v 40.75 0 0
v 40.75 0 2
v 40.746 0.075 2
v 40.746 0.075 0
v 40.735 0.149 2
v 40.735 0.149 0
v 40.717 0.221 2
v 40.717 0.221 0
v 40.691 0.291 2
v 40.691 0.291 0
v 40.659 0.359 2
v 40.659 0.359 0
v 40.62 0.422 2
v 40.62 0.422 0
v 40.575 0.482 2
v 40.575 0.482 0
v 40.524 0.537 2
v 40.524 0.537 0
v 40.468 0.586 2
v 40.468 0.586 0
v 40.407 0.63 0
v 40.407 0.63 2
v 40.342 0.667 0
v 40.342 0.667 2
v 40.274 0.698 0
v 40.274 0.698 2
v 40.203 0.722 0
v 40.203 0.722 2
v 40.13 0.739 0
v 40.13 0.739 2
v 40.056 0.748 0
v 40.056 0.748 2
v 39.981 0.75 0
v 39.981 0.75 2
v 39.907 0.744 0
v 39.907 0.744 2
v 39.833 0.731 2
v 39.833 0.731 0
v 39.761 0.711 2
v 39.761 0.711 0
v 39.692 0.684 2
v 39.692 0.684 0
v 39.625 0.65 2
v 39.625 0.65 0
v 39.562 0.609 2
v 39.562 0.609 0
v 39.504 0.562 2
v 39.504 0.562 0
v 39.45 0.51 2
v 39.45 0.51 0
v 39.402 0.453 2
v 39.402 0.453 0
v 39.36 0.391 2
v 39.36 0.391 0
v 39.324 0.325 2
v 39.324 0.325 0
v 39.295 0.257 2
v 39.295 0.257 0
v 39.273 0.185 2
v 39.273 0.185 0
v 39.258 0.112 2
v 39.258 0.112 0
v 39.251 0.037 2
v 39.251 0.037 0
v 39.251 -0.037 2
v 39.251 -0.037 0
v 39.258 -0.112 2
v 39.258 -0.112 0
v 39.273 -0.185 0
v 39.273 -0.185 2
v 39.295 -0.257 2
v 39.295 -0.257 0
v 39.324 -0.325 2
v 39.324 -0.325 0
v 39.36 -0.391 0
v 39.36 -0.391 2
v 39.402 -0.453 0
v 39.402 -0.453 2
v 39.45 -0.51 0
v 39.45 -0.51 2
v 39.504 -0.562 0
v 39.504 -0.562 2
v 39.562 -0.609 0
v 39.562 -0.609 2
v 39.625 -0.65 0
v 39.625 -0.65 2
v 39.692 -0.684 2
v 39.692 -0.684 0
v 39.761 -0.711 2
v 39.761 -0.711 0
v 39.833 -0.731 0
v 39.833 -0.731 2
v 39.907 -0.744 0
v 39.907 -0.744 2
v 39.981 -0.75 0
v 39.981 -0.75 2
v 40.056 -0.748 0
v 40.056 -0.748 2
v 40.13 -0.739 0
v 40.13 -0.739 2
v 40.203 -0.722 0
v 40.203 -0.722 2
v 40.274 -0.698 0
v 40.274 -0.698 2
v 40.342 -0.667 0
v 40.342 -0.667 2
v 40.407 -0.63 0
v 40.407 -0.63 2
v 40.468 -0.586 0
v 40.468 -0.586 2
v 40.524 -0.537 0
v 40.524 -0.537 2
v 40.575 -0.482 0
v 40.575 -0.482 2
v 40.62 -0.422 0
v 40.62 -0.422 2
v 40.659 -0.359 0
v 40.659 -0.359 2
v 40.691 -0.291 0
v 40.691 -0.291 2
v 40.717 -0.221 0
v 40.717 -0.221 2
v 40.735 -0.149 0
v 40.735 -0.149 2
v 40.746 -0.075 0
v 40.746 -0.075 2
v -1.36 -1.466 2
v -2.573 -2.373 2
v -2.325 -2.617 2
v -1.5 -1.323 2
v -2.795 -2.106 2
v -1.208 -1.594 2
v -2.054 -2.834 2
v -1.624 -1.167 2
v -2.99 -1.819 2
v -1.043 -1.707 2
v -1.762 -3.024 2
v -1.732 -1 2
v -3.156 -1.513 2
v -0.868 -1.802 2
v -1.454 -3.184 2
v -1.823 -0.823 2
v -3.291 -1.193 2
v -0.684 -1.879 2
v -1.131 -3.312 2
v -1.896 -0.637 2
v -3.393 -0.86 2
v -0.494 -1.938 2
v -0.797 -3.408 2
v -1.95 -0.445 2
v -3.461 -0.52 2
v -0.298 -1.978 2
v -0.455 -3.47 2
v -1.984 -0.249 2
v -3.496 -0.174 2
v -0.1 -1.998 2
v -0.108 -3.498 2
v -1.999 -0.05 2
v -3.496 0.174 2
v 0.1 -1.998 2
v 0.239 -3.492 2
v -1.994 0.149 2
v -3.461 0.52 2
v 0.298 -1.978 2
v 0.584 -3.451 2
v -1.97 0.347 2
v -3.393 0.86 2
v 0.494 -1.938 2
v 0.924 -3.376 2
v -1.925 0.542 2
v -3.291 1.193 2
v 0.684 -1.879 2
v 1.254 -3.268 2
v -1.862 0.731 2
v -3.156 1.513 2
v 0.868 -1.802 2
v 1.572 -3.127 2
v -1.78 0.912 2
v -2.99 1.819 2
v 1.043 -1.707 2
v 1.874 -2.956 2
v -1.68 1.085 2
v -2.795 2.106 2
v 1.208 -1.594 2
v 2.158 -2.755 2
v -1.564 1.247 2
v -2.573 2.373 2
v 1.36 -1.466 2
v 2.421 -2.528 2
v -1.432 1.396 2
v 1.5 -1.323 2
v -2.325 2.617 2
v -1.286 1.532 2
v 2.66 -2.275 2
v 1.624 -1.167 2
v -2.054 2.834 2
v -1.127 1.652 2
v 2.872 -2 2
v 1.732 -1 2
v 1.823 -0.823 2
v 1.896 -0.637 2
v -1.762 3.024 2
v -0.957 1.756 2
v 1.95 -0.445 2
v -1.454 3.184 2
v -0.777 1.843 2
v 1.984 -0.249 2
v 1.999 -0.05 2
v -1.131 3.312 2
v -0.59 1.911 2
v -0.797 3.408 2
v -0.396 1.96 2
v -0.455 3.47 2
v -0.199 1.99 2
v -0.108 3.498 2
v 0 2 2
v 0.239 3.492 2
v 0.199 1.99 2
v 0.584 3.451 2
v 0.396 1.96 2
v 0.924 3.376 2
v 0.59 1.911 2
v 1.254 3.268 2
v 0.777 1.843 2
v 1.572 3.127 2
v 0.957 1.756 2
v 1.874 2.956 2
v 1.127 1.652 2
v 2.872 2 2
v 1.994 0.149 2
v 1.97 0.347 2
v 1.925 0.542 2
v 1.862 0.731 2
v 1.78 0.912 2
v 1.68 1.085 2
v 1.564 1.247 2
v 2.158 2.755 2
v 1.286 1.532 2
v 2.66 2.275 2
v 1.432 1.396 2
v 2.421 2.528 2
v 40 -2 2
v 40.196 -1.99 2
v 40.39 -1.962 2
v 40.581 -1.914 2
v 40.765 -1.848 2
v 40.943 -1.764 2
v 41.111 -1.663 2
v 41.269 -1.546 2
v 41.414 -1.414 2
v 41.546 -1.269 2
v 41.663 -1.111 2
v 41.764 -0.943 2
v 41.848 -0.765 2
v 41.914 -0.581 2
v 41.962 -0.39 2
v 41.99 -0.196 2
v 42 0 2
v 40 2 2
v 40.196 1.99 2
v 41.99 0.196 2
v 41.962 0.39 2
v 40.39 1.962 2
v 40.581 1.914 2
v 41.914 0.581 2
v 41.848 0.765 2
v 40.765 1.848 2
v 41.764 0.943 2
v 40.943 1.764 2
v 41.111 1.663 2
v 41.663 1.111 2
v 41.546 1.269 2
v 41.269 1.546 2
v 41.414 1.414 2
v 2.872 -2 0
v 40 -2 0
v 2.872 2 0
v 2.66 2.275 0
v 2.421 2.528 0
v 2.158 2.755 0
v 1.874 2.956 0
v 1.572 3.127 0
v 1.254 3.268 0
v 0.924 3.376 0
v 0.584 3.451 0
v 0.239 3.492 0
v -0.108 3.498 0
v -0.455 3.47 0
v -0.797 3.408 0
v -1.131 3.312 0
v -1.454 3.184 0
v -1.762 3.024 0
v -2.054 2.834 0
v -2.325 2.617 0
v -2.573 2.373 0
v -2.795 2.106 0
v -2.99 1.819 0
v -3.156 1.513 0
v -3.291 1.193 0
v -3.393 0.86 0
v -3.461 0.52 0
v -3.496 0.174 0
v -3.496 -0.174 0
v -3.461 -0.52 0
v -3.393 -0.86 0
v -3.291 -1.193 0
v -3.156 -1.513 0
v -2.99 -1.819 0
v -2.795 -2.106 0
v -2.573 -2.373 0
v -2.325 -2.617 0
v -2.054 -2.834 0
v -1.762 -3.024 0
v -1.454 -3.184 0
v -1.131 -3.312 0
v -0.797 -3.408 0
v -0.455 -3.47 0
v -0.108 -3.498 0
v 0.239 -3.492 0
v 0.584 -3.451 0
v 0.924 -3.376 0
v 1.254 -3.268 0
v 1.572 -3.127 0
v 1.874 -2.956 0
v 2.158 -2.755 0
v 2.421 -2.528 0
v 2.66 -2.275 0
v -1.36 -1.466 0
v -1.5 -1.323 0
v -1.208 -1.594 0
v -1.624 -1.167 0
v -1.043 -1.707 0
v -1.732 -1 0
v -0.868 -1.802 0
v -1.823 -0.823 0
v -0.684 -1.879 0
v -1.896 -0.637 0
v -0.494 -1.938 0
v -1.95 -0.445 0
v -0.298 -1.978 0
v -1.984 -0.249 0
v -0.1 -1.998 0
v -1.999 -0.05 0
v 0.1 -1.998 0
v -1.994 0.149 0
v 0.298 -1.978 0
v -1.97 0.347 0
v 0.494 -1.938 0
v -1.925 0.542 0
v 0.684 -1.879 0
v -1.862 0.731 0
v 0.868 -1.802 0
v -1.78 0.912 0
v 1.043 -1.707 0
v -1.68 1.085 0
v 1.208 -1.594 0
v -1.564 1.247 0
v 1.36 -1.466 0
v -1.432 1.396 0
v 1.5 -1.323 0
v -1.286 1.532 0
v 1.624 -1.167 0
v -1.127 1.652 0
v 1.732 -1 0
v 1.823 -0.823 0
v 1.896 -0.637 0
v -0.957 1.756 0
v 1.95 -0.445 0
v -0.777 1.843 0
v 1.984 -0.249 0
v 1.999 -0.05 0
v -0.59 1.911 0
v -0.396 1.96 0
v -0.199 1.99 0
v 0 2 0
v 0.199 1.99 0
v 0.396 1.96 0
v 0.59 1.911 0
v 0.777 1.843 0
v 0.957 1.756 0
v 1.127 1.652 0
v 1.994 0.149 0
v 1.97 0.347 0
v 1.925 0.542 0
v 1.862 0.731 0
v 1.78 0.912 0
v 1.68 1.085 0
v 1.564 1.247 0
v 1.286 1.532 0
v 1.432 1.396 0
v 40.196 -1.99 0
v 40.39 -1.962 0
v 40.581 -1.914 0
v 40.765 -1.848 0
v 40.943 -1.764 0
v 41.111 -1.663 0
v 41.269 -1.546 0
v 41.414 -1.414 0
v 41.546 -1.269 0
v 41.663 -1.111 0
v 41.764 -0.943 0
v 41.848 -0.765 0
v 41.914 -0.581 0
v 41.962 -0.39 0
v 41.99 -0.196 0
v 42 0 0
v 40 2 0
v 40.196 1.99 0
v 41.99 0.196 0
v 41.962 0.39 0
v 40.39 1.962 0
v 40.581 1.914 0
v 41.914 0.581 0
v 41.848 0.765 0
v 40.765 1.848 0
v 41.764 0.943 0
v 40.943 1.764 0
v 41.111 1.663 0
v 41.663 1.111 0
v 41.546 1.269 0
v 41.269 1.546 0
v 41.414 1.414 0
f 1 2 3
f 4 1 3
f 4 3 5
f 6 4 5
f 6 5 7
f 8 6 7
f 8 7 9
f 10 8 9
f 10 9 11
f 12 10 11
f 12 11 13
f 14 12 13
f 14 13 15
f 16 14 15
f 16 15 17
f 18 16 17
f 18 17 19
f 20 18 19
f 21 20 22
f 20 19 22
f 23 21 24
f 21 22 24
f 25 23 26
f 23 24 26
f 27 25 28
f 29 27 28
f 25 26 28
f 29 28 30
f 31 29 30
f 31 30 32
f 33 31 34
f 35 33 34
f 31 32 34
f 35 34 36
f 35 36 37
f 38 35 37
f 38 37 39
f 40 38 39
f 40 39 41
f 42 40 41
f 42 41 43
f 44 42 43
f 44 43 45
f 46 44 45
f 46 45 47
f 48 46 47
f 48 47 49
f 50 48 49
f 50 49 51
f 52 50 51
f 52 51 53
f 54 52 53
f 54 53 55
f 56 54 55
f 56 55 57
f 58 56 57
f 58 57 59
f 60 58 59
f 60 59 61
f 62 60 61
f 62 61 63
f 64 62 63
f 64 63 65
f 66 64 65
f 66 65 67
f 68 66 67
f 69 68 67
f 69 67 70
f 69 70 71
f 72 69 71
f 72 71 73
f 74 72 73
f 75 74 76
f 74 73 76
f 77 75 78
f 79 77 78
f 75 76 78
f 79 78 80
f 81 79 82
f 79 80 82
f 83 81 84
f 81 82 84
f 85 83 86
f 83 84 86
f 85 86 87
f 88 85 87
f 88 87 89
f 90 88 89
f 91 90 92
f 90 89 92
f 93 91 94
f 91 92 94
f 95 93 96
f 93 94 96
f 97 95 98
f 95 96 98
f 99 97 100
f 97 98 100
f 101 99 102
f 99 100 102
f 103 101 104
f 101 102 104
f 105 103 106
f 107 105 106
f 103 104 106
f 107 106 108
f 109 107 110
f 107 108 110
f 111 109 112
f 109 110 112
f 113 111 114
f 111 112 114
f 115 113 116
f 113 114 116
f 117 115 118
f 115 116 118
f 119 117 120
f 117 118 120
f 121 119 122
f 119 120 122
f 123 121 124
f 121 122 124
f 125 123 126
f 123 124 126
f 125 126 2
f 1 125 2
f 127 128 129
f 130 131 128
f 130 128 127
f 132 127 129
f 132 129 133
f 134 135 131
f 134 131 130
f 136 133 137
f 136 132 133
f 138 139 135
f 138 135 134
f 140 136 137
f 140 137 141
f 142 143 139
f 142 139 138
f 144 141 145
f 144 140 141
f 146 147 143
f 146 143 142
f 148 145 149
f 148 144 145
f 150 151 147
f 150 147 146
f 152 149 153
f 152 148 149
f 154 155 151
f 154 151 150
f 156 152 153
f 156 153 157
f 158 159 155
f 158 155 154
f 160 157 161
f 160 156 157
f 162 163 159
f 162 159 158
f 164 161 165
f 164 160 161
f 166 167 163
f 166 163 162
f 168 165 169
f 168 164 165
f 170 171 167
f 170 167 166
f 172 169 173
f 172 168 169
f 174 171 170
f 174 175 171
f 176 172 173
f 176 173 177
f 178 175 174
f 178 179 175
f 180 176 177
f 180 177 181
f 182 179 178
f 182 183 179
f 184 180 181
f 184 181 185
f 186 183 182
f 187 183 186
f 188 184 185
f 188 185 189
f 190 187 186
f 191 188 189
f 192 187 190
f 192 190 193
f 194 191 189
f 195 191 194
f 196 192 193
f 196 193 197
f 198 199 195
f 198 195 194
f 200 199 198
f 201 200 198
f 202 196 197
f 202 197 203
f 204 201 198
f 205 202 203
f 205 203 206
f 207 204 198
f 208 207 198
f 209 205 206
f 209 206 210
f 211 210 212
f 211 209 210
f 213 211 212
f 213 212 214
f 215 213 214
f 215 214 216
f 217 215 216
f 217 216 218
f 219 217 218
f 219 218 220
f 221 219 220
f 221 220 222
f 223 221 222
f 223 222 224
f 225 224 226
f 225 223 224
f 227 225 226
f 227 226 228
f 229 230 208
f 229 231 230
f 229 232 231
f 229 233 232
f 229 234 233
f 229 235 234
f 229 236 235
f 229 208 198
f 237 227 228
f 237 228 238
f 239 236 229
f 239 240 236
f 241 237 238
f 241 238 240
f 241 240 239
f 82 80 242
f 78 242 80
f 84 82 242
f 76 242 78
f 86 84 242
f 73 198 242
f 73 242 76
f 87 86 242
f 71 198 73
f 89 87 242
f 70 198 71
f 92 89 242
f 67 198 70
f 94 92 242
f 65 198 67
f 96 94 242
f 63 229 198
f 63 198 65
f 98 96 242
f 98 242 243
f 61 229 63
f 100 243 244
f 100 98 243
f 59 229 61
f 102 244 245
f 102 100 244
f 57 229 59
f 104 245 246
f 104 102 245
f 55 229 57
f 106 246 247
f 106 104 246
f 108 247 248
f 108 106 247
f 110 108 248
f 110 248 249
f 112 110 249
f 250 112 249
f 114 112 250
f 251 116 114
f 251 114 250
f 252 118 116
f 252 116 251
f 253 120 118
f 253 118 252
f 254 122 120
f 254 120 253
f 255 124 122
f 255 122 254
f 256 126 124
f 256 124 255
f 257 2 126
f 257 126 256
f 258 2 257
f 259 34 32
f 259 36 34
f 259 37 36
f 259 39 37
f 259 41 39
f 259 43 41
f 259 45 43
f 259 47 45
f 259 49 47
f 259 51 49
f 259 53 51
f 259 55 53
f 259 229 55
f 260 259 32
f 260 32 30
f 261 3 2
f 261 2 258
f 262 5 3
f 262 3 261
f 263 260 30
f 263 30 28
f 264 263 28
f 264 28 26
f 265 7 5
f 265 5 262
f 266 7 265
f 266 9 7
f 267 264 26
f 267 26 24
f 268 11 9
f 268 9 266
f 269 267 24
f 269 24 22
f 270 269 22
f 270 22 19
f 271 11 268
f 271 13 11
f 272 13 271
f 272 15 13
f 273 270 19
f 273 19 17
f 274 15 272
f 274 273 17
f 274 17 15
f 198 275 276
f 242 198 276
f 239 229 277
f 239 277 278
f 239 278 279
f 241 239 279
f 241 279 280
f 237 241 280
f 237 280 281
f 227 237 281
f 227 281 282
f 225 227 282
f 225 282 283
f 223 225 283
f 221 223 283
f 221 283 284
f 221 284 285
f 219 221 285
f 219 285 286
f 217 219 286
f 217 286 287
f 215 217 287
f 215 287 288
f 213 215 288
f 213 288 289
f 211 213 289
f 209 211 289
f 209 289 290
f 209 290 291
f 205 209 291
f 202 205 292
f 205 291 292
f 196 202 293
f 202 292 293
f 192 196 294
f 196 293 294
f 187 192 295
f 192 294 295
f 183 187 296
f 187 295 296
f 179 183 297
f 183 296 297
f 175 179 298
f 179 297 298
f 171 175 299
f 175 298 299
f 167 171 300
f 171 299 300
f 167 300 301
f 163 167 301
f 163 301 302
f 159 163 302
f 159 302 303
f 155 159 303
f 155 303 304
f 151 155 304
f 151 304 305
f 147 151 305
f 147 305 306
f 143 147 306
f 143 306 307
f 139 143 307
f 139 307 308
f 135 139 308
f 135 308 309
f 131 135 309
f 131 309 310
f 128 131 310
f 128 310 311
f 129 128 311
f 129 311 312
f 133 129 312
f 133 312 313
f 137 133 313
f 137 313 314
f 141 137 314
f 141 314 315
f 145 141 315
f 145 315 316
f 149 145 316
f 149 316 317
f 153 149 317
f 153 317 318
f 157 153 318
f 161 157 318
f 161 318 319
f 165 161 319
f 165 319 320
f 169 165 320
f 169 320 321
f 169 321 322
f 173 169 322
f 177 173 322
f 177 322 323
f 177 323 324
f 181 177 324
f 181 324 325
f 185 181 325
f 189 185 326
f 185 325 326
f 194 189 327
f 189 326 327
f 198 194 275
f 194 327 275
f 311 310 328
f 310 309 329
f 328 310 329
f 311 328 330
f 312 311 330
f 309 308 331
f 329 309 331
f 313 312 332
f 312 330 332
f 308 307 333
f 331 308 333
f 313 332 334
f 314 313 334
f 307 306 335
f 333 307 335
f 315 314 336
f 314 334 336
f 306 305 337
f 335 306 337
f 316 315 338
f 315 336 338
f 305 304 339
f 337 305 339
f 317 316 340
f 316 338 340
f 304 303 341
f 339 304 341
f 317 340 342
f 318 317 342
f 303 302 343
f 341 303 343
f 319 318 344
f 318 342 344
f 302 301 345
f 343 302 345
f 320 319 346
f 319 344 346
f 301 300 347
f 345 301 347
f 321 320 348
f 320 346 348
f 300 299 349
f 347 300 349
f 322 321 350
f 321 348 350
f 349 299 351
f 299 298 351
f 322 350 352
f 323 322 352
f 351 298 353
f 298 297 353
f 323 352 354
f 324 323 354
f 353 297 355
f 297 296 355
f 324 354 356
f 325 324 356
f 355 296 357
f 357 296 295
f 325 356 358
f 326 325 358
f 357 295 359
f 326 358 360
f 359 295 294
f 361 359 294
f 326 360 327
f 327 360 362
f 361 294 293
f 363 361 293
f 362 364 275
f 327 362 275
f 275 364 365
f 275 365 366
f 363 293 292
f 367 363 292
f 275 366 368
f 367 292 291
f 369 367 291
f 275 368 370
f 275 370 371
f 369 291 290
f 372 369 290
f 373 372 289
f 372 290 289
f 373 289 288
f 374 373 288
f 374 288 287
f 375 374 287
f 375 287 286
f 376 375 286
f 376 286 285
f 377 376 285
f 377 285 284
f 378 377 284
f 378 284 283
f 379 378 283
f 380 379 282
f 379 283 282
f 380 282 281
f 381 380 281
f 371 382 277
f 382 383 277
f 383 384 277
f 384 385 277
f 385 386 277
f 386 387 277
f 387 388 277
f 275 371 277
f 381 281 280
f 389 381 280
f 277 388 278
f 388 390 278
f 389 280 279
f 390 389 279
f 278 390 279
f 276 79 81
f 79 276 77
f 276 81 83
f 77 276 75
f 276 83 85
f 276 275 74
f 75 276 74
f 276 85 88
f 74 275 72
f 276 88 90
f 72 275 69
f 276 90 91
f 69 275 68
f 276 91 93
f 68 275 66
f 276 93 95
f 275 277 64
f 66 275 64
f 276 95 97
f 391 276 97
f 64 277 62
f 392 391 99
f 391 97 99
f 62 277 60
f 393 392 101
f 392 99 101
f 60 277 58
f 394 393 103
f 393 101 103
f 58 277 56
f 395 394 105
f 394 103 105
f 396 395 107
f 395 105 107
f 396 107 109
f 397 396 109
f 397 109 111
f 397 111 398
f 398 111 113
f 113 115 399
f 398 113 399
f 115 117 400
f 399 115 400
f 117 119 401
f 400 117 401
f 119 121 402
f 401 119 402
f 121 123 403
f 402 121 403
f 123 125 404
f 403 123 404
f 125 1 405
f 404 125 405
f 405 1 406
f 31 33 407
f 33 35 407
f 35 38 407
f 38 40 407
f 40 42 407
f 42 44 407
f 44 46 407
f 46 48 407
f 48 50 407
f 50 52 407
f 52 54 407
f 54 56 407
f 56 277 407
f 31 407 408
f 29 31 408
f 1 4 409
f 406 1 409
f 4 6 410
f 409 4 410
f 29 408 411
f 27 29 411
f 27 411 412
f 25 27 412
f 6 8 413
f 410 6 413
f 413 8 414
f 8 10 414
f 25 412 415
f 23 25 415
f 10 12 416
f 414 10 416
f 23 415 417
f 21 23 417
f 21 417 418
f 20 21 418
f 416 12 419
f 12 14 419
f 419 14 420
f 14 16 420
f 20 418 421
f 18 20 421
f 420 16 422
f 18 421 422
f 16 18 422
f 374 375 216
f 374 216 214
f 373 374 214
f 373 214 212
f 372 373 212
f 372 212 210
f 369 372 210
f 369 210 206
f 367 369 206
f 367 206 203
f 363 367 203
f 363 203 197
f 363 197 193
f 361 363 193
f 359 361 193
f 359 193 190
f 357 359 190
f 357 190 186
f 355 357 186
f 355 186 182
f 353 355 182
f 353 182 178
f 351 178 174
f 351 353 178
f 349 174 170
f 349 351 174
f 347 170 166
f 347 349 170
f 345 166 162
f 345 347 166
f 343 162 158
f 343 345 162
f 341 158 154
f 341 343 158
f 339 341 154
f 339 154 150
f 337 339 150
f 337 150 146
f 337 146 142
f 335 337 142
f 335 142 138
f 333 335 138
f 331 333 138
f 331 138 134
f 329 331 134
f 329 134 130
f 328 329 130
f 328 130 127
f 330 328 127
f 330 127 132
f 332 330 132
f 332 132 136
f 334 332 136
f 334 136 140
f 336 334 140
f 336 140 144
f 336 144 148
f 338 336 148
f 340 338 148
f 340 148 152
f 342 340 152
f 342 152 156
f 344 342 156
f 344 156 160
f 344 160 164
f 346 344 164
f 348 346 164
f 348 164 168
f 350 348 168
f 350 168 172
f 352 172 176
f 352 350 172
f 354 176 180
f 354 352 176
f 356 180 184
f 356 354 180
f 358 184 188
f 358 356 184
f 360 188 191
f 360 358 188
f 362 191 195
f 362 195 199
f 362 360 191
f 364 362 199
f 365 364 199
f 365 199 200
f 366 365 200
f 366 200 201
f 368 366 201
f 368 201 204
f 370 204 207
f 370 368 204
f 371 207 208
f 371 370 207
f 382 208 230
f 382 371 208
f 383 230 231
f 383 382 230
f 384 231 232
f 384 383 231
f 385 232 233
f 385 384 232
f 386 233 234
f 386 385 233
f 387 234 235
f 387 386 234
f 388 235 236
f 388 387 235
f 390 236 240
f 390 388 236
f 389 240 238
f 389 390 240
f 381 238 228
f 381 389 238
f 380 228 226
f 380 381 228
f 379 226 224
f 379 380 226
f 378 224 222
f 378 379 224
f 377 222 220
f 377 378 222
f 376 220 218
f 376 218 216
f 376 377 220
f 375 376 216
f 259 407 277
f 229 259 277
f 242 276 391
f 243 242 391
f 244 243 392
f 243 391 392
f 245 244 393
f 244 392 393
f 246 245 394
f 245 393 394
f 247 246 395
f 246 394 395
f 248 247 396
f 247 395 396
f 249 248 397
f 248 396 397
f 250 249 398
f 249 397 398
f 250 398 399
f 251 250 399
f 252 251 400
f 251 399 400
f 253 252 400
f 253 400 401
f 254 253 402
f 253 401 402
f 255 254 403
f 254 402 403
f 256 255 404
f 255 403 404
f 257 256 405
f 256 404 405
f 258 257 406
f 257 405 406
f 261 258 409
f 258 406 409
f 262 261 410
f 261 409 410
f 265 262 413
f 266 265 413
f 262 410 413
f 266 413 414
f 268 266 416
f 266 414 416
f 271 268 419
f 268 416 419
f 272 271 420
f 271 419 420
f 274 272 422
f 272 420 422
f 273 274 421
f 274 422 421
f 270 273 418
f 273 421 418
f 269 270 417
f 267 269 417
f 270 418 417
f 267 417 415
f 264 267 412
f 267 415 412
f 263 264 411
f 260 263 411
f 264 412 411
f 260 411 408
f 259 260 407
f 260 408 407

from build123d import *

# Parameters (mm, degrees)
BOSS_EXTRUDE1_DEPTH     = 2
SKETCH2_R               = 2
BOSS_EXTRUDE2_DEPTH     = 8
CROQUIS1_R              = 0.75
CORTAR_EXTRUIR1_DEPTH   = 10
CORTAR_EXTRUIR2_START   = -16
CROQUIS2_R              = 2
CORTAR_EXTRUIR2_DEPTH   = 16
SALIENTE_EXTRUIR1_START = -2
CROQUIS3_R              = 3.5
CROQUIS3_R_2            = 2
SALIENTE_EXTRUIR1_DEPTH = 2


with BuildPart() as part:
    # Sketch1 → Boss-Extrude1 (new body)
    with BuildSketch(Plane.XY):
        with BuildLine():
            Line((0, -2), (40, -2))
            ThreePointArc((40, -2), (42, 0), (40, 2))
            Line((40, 2), (0, 2))
            ThreePointArc((0, 2), (-2, 0), (0, -2))
        make_face()
    extrude(amount=BOSS_EXTRUDE1_DEPTH)

    # Sketch2 → Boss-Extrude2 (add)
    with BuildSketch(Plane.XY.offset(2)):
        with Locations(Location((0, 0, 0), (0, 0, 270))):
            Circle(SKETCH2_R)
    extrude(amount=BOSS_EXTRUDE2_DEPTH)

    # Croquis1 → Cortar-Extruir1 (cut)
    with BuildSketch(Plane.XY.offset(2)):
        with Locations((40, 0)):
            Circle(CROQUIS1_R)
    extrude(amount=-CORTAR_EXTRUIR1_DEPTH, mode=Mode.SUBTRACT)

    # Croquis2 → Cortar-Extruir2 (cut)
    with BuildSketch(Plane.XY.offset(10).offset(CORTAR_EXTRUIR2_START)):
        Circle(CROQUIS2_R)
    extrude(amount=CORTAR_EXTRUIR2_DEPTH, mode=Mode.SUBTRACT)

    # Croquis3 → Saliente-Extruir1 (add)
    with BuildSketch(Plane.XY.offset(2).offset(SALIENTE_EXTRUIR1_START)):
        Circle(CROQUIS3_R)
        Circle(CROQUIS3_R_2, mode=Mode.SUBTRACT)
    extrude(amount=SALIENTE_EXTRUIR1_DEPTH)


solid = part.part
